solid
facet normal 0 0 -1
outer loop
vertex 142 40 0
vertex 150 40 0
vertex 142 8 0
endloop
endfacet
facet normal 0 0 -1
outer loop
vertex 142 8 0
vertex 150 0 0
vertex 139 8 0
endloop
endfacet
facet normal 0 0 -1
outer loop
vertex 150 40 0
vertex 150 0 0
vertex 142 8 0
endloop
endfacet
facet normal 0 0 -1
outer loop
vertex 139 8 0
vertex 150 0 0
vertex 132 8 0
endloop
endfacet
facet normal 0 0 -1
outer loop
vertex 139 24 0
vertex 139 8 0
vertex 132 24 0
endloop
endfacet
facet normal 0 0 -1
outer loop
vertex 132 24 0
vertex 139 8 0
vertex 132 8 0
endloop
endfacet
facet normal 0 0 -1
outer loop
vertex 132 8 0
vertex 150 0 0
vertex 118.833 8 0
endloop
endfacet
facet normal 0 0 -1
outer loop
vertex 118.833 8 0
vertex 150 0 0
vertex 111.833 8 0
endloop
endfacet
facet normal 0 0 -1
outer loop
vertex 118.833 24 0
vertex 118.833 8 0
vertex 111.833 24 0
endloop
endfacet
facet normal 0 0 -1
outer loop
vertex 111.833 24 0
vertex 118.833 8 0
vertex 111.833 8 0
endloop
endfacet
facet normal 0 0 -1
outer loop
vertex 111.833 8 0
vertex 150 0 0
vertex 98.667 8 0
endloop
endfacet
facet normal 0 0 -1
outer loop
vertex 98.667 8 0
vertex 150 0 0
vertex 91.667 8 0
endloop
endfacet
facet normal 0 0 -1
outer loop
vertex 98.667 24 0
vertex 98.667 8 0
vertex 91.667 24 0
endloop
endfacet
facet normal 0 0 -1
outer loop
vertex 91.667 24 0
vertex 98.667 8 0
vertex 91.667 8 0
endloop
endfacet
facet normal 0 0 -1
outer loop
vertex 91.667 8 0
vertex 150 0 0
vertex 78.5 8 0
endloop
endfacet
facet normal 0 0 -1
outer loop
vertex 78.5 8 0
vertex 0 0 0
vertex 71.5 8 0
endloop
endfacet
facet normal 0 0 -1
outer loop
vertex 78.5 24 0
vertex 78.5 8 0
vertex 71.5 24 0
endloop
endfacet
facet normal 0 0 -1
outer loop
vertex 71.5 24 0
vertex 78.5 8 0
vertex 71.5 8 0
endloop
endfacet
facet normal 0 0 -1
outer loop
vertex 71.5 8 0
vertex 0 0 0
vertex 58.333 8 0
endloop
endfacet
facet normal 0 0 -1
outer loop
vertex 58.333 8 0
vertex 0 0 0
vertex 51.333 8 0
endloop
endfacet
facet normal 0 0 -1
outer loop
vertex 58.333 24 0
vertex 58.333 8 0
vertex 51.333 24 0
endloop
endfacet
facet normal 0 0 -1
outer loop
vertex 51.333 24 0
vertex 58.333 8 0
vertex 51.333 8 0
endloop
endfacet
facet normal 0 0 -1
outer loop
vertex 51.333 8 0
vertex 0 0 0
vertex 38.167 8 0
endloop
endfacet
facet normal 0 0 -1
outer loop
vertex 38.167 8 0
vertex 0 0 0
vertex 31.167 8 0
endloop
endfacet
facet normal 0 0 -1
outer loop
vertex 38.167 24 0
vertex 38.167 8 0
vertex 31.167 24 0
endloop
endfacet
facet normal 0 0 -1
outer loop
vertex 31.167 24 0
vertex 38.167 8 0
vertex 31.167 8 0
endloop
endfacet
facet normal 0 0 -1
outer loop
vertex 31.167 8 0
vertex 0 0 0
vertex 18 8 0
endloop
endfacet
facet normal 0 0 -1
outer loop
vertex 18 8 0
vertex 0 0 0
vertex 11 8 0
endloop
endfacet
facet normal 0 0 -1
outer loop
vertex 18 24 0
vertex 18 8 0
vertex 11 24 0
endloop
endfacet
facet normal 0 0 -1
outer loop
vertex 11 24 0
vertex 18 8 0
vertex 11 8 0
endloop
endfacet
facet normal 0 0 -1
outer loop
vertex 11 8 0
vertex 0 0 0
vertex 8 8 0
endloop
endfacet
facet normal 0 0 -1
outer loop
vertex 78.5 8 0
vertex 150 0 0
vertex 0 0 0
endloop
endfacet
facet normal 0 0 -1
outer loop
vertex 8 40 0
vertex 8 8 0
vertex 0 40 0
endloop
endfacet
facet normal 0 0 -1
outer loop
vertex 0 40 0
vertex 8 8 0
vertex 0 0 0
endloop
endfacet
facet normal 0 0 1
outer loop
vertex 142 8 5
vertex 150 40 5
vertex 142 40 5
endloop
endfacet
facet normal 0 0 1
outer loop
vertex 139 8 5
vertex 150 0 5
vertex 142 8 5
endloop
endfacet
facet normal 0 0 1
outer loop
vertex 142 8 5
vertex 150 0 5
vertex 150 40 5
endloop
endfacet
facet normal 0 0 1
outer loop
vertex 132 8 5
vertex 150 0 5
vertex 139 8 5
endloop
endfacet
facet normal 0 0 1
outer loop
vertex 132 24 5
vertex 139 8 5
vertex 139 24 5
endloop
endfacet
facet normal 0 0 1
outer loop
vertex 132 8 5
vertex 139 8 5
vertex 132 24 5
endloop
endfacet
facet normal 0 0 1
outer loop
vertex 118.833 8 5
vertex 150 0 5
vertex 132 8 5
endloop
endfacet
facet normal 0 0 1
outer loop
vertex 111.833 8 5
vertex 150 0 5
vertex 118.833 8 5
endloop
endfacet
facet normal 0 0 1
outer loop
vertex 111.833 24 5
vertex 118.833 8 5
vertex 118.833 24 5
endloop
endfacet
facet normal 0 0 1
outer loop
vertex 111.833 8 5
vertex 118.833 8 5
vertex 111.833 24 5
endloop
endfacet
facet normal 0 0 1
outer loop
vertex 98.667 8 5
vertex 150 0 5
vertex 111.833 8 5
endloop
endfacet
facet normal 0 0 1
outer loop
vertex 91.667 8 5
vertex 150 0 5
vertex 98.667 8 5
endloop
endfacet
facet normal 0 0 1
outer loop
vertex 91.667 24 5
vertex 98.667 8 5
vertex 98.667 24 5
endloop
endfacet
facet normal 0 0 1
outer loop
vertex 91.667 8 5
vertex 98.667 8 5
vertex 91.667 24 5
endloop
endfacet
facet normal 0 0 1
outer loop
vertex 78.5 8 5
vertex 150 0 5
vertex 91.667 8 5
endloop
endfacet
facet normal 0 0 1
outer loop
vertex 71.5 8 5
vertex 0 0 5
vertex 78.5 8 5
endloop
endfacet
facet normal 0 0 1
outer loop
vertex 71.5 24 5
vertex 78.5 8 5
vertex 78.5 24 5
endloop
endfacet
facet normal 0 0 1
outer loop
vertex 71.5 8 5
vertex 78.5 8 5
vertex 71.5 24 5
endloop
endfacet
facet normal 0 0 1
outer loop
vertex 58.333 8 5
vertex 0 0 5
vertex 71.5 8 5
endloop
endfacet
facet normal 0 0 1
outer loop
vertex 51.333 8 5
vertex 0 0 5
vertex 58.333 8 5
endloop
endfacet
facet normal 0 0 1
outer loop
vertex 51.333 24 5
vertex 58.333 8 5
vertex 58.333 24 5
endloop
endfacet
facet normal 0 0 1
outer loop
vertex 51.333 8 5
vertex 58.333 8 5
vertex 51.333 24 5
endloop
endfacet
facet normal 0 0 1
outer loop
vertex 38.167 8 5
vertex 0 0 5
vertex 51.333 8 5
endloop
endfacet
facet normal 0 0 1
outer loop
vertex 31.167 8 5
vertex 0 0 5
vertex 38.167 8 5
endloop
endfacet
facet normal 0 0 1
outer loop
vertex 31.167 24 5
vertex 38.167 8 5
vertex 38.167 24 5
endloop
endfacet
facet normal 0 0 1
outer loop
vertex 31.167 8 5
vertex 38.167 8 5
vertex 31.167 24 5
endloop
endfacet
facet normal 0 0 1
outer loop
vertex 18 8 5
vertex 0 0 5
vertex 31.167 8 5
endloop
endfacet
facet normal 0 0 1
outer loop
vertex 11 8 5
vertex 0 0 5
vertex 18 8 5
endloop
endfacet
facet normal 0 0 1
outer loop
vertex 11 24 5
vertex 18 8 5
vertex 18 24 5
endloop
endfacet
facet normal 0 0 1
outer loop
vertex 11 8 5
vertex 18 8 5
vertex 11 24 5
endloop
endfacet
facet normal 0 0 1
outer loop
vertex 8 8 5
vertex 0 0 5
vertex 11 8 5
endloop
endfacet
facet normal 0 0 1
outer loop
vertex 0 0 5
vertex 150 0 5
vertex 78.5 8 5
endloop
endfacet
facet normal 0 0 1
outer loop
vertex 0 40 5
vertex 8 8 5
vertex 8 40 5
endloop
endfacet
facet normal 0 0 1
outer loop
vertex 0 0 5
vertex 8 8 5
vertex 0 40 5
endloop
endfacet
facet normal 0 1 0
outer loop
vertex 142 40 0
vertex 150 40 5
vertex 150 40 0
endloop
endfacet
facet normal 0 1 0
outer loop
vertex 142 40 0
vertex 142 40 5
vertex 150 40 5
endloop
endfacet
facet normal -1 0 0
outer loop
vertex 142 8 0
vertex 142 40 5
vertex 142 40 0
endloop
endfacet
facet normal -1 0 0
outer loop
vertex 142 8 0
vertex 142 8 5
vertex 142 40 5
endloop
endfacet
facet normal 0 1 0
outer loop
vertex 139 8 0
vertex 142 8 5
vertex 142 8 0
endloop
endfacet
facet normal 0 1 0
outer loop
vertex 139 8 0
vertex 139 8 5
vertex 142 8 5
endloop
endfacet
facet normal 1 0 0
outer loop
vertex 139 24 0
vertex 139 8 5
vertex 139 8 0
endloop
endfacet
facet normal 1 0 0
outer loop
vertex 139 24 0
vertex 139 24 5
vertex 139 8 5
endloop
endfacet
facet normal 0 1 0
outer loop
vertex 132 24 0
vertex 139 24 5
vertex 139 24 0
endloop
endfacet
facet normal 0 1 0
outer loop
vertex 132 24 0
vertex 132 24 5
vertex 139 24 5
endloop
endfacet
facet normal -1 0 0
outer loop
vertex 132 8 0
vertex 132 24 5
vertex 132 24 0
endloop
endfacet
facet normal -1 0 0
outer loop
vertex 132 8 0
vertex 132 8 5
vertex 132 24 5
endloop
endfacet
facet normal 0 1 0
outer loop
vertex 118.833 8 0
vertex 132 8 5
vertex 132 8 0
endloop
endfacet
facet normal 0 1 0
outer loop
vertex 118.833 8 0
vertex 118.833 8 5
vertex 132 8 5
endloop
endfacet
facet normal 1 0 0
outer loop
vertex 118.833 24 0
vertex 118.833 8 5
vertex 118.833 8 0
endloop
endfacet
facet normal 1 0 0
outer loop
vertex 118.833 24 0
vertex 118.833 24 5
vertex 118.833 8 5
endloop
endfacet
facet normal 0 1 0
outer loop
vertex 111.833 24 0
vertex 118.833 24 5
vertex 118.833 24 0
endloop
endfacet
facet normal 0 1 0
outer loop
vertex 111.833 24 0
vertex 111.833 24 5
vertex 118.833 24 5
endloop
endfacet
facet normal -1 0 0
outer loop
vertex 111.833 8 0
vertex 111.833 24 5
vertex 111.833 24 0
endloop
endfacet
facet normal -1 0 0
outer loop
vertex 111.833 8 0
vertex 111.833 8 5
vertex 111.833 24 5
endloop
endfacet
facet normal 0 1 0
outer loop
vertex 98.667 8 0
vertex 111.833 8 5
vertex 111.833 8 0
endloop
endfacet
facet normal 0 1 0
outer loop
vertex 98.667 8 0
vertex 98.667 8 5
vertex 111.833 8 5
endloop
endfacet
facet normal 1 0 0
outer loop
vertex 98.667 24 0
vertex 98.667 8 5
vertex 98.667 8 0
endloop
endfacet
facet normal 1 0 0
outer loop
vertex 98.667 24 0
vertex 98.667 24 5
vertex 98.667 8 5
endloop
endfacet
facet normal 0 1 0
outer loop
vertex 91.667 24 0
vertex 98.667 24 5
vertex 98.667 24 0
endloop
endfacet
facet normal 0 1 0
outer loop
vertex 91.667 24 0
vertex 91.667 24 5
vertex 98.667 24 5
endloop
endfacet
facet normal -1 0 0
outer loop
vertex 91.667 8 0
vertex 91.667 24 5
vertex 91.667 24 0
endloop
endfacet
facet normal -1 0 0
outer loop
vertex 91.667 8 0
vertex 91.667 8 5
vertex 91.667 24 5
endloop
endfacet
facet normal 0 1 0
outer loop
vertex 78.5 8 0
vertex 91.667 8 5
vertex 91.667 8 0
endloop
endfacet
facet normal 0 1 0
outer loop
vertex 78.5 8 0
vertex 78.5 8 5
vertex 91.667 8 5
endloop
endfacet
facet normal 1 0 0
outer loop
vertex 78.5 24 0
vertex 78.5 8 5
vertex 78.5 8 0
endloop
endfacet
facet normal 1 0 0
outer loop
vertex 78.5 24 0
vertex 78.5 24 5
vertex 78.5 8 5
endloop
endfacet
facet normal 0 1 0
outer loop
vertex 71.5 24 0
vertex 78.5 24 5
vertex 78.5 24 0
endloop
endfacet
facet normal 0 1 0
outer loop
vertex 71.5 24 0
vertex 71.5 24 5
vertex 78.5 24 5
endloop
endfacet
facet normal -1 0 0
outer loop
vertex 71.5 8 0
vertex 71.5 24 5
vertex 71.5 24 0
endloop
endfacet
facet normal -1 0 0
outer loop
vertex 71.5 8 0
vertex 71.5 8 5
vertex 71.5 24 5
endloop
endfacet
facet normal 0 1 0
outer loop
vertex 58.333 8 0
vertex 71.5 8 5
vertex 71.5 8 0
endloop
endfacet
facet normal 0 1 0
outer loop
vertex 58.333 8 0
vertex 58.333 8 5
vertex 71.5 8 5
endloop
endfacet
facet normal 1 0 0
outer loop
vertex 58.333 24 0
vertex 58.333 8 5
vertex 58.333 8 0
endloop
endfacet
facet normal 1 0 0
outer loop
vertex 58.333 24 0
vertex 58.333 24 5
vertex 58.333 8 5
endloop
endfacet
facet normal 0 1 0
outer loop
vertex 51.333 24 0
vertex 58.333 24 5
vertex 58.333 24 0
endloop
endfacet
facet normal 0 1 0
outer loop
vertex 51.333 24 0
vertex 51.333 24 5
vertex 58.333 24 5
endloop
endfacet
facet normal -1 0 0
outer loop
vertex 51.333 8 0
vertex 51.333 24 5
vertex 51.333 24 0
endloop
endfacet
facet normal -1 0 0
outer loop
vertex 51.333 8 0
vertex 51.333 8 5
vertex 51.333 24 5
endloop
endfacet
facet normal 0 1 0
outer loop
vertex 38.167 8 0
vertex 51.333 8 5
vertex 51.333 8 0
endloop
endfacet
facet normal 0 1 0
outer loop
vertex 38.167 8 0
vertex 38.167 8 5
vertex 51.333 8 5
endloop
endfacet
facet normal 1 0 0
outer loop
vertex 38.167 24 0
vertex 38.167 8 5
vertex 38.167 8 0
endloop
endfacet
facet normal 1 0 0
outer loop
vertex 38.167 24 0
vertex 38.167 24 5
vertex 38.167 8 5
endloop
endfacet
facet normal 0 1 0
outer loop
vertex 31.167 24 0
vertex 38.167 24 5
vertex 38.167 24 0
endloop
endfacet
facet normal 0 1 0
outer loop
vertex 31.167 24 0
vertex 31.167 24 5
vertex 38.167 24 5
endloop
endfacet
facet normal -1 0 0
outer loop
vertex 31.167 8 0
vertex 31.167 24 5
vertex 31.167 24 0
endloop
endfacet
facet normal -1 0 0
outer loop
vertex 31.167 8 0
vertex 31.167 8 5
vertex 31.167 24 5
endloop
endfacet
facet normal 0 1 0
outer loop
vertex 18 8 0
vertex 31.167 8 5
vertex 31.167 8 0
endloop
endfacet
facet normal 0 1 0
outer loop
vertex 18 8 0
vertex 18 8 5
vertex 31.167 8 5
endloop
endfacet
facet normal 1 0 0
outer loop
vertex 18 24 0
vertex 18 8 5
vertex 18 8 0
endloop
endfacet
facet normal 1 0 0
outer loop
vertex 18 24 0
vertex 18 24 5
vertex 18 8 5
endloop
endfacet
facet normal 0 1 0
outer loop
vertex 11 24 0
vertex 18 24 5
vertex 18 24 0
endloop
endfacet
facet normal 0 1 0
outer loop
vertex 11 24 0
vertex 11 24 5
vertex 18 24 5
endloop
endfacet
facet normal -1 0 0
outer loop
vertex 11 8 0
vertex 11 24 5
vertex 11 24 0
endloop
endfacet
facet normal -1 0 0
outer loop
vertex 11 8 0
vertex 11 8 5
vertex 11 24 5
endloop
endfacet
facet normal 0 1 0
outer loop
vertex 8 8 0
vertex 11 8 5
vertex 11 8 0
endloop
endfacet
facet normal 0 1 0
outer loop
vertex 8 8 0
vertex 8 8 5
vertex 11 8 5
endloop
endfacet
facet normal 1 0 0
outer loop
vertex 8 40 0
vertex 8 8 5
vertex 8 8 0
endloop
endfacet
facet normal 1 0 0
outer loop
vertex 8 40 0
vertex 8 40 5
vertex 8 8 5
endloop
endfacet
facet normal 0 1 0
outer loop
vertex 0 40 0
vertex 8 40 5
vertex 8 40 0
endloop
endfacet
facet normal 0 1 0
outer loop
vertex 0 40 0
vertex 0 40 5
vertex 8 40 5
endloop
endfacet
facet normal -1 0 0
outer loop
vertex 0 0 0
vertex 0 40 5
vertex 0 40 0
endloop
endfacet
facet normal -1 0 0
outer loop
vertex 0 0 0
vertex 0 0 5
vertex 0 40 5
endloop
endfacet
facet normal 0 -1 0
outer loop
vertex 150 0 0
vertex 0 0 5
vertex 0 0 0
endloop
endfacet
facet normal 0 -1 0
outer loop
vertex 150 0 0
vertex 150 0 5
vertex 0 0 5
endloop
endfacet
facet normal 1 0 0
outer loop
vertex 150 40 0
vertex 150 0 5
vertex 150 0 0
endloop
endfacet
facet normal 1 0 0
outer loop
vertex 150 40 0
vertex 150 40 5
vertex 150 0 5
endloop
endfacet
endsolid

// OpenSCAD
$fn = 32;

// ----------------------------------------------------------------------
// Guard grille: 7 slats over a 150 x 40 mm plate
// ----------------------------------------------------------------------

// --- parameters (mm) ---
profile_height = 5;       // extrusion height
profile_points = 36;      // points of the closed outline

profile = [[0, 0], [150, 0], [150, 40], [142, 40], [142, 8], [139, 8], [139, 24], [132, 24], [132, 8], [118.833, 8], [118.833, 24], [111.833, 24], [111.833, 8], [98.667, 8], [98.667, 24], [91.667, 24], [91.667, 8], [78.5, 8], [78.5, 24], [71.5, 24], [71.5, 8], [58.333, 8], [58.333, 24], [51.333, 24], [51.333, 8], [38.167, 8], [38.167, 24], [31.167, 24], [31.167, 8], [18, 8], [18, 24], [11, 24], [11, 8], [8, 8], [8, 40], [0, 40]];  // single closed polygon, 36 points, counter clockwise

// --- the one profile operation ---
linear_extrude(height = profile_height) polygon(points = profile);
